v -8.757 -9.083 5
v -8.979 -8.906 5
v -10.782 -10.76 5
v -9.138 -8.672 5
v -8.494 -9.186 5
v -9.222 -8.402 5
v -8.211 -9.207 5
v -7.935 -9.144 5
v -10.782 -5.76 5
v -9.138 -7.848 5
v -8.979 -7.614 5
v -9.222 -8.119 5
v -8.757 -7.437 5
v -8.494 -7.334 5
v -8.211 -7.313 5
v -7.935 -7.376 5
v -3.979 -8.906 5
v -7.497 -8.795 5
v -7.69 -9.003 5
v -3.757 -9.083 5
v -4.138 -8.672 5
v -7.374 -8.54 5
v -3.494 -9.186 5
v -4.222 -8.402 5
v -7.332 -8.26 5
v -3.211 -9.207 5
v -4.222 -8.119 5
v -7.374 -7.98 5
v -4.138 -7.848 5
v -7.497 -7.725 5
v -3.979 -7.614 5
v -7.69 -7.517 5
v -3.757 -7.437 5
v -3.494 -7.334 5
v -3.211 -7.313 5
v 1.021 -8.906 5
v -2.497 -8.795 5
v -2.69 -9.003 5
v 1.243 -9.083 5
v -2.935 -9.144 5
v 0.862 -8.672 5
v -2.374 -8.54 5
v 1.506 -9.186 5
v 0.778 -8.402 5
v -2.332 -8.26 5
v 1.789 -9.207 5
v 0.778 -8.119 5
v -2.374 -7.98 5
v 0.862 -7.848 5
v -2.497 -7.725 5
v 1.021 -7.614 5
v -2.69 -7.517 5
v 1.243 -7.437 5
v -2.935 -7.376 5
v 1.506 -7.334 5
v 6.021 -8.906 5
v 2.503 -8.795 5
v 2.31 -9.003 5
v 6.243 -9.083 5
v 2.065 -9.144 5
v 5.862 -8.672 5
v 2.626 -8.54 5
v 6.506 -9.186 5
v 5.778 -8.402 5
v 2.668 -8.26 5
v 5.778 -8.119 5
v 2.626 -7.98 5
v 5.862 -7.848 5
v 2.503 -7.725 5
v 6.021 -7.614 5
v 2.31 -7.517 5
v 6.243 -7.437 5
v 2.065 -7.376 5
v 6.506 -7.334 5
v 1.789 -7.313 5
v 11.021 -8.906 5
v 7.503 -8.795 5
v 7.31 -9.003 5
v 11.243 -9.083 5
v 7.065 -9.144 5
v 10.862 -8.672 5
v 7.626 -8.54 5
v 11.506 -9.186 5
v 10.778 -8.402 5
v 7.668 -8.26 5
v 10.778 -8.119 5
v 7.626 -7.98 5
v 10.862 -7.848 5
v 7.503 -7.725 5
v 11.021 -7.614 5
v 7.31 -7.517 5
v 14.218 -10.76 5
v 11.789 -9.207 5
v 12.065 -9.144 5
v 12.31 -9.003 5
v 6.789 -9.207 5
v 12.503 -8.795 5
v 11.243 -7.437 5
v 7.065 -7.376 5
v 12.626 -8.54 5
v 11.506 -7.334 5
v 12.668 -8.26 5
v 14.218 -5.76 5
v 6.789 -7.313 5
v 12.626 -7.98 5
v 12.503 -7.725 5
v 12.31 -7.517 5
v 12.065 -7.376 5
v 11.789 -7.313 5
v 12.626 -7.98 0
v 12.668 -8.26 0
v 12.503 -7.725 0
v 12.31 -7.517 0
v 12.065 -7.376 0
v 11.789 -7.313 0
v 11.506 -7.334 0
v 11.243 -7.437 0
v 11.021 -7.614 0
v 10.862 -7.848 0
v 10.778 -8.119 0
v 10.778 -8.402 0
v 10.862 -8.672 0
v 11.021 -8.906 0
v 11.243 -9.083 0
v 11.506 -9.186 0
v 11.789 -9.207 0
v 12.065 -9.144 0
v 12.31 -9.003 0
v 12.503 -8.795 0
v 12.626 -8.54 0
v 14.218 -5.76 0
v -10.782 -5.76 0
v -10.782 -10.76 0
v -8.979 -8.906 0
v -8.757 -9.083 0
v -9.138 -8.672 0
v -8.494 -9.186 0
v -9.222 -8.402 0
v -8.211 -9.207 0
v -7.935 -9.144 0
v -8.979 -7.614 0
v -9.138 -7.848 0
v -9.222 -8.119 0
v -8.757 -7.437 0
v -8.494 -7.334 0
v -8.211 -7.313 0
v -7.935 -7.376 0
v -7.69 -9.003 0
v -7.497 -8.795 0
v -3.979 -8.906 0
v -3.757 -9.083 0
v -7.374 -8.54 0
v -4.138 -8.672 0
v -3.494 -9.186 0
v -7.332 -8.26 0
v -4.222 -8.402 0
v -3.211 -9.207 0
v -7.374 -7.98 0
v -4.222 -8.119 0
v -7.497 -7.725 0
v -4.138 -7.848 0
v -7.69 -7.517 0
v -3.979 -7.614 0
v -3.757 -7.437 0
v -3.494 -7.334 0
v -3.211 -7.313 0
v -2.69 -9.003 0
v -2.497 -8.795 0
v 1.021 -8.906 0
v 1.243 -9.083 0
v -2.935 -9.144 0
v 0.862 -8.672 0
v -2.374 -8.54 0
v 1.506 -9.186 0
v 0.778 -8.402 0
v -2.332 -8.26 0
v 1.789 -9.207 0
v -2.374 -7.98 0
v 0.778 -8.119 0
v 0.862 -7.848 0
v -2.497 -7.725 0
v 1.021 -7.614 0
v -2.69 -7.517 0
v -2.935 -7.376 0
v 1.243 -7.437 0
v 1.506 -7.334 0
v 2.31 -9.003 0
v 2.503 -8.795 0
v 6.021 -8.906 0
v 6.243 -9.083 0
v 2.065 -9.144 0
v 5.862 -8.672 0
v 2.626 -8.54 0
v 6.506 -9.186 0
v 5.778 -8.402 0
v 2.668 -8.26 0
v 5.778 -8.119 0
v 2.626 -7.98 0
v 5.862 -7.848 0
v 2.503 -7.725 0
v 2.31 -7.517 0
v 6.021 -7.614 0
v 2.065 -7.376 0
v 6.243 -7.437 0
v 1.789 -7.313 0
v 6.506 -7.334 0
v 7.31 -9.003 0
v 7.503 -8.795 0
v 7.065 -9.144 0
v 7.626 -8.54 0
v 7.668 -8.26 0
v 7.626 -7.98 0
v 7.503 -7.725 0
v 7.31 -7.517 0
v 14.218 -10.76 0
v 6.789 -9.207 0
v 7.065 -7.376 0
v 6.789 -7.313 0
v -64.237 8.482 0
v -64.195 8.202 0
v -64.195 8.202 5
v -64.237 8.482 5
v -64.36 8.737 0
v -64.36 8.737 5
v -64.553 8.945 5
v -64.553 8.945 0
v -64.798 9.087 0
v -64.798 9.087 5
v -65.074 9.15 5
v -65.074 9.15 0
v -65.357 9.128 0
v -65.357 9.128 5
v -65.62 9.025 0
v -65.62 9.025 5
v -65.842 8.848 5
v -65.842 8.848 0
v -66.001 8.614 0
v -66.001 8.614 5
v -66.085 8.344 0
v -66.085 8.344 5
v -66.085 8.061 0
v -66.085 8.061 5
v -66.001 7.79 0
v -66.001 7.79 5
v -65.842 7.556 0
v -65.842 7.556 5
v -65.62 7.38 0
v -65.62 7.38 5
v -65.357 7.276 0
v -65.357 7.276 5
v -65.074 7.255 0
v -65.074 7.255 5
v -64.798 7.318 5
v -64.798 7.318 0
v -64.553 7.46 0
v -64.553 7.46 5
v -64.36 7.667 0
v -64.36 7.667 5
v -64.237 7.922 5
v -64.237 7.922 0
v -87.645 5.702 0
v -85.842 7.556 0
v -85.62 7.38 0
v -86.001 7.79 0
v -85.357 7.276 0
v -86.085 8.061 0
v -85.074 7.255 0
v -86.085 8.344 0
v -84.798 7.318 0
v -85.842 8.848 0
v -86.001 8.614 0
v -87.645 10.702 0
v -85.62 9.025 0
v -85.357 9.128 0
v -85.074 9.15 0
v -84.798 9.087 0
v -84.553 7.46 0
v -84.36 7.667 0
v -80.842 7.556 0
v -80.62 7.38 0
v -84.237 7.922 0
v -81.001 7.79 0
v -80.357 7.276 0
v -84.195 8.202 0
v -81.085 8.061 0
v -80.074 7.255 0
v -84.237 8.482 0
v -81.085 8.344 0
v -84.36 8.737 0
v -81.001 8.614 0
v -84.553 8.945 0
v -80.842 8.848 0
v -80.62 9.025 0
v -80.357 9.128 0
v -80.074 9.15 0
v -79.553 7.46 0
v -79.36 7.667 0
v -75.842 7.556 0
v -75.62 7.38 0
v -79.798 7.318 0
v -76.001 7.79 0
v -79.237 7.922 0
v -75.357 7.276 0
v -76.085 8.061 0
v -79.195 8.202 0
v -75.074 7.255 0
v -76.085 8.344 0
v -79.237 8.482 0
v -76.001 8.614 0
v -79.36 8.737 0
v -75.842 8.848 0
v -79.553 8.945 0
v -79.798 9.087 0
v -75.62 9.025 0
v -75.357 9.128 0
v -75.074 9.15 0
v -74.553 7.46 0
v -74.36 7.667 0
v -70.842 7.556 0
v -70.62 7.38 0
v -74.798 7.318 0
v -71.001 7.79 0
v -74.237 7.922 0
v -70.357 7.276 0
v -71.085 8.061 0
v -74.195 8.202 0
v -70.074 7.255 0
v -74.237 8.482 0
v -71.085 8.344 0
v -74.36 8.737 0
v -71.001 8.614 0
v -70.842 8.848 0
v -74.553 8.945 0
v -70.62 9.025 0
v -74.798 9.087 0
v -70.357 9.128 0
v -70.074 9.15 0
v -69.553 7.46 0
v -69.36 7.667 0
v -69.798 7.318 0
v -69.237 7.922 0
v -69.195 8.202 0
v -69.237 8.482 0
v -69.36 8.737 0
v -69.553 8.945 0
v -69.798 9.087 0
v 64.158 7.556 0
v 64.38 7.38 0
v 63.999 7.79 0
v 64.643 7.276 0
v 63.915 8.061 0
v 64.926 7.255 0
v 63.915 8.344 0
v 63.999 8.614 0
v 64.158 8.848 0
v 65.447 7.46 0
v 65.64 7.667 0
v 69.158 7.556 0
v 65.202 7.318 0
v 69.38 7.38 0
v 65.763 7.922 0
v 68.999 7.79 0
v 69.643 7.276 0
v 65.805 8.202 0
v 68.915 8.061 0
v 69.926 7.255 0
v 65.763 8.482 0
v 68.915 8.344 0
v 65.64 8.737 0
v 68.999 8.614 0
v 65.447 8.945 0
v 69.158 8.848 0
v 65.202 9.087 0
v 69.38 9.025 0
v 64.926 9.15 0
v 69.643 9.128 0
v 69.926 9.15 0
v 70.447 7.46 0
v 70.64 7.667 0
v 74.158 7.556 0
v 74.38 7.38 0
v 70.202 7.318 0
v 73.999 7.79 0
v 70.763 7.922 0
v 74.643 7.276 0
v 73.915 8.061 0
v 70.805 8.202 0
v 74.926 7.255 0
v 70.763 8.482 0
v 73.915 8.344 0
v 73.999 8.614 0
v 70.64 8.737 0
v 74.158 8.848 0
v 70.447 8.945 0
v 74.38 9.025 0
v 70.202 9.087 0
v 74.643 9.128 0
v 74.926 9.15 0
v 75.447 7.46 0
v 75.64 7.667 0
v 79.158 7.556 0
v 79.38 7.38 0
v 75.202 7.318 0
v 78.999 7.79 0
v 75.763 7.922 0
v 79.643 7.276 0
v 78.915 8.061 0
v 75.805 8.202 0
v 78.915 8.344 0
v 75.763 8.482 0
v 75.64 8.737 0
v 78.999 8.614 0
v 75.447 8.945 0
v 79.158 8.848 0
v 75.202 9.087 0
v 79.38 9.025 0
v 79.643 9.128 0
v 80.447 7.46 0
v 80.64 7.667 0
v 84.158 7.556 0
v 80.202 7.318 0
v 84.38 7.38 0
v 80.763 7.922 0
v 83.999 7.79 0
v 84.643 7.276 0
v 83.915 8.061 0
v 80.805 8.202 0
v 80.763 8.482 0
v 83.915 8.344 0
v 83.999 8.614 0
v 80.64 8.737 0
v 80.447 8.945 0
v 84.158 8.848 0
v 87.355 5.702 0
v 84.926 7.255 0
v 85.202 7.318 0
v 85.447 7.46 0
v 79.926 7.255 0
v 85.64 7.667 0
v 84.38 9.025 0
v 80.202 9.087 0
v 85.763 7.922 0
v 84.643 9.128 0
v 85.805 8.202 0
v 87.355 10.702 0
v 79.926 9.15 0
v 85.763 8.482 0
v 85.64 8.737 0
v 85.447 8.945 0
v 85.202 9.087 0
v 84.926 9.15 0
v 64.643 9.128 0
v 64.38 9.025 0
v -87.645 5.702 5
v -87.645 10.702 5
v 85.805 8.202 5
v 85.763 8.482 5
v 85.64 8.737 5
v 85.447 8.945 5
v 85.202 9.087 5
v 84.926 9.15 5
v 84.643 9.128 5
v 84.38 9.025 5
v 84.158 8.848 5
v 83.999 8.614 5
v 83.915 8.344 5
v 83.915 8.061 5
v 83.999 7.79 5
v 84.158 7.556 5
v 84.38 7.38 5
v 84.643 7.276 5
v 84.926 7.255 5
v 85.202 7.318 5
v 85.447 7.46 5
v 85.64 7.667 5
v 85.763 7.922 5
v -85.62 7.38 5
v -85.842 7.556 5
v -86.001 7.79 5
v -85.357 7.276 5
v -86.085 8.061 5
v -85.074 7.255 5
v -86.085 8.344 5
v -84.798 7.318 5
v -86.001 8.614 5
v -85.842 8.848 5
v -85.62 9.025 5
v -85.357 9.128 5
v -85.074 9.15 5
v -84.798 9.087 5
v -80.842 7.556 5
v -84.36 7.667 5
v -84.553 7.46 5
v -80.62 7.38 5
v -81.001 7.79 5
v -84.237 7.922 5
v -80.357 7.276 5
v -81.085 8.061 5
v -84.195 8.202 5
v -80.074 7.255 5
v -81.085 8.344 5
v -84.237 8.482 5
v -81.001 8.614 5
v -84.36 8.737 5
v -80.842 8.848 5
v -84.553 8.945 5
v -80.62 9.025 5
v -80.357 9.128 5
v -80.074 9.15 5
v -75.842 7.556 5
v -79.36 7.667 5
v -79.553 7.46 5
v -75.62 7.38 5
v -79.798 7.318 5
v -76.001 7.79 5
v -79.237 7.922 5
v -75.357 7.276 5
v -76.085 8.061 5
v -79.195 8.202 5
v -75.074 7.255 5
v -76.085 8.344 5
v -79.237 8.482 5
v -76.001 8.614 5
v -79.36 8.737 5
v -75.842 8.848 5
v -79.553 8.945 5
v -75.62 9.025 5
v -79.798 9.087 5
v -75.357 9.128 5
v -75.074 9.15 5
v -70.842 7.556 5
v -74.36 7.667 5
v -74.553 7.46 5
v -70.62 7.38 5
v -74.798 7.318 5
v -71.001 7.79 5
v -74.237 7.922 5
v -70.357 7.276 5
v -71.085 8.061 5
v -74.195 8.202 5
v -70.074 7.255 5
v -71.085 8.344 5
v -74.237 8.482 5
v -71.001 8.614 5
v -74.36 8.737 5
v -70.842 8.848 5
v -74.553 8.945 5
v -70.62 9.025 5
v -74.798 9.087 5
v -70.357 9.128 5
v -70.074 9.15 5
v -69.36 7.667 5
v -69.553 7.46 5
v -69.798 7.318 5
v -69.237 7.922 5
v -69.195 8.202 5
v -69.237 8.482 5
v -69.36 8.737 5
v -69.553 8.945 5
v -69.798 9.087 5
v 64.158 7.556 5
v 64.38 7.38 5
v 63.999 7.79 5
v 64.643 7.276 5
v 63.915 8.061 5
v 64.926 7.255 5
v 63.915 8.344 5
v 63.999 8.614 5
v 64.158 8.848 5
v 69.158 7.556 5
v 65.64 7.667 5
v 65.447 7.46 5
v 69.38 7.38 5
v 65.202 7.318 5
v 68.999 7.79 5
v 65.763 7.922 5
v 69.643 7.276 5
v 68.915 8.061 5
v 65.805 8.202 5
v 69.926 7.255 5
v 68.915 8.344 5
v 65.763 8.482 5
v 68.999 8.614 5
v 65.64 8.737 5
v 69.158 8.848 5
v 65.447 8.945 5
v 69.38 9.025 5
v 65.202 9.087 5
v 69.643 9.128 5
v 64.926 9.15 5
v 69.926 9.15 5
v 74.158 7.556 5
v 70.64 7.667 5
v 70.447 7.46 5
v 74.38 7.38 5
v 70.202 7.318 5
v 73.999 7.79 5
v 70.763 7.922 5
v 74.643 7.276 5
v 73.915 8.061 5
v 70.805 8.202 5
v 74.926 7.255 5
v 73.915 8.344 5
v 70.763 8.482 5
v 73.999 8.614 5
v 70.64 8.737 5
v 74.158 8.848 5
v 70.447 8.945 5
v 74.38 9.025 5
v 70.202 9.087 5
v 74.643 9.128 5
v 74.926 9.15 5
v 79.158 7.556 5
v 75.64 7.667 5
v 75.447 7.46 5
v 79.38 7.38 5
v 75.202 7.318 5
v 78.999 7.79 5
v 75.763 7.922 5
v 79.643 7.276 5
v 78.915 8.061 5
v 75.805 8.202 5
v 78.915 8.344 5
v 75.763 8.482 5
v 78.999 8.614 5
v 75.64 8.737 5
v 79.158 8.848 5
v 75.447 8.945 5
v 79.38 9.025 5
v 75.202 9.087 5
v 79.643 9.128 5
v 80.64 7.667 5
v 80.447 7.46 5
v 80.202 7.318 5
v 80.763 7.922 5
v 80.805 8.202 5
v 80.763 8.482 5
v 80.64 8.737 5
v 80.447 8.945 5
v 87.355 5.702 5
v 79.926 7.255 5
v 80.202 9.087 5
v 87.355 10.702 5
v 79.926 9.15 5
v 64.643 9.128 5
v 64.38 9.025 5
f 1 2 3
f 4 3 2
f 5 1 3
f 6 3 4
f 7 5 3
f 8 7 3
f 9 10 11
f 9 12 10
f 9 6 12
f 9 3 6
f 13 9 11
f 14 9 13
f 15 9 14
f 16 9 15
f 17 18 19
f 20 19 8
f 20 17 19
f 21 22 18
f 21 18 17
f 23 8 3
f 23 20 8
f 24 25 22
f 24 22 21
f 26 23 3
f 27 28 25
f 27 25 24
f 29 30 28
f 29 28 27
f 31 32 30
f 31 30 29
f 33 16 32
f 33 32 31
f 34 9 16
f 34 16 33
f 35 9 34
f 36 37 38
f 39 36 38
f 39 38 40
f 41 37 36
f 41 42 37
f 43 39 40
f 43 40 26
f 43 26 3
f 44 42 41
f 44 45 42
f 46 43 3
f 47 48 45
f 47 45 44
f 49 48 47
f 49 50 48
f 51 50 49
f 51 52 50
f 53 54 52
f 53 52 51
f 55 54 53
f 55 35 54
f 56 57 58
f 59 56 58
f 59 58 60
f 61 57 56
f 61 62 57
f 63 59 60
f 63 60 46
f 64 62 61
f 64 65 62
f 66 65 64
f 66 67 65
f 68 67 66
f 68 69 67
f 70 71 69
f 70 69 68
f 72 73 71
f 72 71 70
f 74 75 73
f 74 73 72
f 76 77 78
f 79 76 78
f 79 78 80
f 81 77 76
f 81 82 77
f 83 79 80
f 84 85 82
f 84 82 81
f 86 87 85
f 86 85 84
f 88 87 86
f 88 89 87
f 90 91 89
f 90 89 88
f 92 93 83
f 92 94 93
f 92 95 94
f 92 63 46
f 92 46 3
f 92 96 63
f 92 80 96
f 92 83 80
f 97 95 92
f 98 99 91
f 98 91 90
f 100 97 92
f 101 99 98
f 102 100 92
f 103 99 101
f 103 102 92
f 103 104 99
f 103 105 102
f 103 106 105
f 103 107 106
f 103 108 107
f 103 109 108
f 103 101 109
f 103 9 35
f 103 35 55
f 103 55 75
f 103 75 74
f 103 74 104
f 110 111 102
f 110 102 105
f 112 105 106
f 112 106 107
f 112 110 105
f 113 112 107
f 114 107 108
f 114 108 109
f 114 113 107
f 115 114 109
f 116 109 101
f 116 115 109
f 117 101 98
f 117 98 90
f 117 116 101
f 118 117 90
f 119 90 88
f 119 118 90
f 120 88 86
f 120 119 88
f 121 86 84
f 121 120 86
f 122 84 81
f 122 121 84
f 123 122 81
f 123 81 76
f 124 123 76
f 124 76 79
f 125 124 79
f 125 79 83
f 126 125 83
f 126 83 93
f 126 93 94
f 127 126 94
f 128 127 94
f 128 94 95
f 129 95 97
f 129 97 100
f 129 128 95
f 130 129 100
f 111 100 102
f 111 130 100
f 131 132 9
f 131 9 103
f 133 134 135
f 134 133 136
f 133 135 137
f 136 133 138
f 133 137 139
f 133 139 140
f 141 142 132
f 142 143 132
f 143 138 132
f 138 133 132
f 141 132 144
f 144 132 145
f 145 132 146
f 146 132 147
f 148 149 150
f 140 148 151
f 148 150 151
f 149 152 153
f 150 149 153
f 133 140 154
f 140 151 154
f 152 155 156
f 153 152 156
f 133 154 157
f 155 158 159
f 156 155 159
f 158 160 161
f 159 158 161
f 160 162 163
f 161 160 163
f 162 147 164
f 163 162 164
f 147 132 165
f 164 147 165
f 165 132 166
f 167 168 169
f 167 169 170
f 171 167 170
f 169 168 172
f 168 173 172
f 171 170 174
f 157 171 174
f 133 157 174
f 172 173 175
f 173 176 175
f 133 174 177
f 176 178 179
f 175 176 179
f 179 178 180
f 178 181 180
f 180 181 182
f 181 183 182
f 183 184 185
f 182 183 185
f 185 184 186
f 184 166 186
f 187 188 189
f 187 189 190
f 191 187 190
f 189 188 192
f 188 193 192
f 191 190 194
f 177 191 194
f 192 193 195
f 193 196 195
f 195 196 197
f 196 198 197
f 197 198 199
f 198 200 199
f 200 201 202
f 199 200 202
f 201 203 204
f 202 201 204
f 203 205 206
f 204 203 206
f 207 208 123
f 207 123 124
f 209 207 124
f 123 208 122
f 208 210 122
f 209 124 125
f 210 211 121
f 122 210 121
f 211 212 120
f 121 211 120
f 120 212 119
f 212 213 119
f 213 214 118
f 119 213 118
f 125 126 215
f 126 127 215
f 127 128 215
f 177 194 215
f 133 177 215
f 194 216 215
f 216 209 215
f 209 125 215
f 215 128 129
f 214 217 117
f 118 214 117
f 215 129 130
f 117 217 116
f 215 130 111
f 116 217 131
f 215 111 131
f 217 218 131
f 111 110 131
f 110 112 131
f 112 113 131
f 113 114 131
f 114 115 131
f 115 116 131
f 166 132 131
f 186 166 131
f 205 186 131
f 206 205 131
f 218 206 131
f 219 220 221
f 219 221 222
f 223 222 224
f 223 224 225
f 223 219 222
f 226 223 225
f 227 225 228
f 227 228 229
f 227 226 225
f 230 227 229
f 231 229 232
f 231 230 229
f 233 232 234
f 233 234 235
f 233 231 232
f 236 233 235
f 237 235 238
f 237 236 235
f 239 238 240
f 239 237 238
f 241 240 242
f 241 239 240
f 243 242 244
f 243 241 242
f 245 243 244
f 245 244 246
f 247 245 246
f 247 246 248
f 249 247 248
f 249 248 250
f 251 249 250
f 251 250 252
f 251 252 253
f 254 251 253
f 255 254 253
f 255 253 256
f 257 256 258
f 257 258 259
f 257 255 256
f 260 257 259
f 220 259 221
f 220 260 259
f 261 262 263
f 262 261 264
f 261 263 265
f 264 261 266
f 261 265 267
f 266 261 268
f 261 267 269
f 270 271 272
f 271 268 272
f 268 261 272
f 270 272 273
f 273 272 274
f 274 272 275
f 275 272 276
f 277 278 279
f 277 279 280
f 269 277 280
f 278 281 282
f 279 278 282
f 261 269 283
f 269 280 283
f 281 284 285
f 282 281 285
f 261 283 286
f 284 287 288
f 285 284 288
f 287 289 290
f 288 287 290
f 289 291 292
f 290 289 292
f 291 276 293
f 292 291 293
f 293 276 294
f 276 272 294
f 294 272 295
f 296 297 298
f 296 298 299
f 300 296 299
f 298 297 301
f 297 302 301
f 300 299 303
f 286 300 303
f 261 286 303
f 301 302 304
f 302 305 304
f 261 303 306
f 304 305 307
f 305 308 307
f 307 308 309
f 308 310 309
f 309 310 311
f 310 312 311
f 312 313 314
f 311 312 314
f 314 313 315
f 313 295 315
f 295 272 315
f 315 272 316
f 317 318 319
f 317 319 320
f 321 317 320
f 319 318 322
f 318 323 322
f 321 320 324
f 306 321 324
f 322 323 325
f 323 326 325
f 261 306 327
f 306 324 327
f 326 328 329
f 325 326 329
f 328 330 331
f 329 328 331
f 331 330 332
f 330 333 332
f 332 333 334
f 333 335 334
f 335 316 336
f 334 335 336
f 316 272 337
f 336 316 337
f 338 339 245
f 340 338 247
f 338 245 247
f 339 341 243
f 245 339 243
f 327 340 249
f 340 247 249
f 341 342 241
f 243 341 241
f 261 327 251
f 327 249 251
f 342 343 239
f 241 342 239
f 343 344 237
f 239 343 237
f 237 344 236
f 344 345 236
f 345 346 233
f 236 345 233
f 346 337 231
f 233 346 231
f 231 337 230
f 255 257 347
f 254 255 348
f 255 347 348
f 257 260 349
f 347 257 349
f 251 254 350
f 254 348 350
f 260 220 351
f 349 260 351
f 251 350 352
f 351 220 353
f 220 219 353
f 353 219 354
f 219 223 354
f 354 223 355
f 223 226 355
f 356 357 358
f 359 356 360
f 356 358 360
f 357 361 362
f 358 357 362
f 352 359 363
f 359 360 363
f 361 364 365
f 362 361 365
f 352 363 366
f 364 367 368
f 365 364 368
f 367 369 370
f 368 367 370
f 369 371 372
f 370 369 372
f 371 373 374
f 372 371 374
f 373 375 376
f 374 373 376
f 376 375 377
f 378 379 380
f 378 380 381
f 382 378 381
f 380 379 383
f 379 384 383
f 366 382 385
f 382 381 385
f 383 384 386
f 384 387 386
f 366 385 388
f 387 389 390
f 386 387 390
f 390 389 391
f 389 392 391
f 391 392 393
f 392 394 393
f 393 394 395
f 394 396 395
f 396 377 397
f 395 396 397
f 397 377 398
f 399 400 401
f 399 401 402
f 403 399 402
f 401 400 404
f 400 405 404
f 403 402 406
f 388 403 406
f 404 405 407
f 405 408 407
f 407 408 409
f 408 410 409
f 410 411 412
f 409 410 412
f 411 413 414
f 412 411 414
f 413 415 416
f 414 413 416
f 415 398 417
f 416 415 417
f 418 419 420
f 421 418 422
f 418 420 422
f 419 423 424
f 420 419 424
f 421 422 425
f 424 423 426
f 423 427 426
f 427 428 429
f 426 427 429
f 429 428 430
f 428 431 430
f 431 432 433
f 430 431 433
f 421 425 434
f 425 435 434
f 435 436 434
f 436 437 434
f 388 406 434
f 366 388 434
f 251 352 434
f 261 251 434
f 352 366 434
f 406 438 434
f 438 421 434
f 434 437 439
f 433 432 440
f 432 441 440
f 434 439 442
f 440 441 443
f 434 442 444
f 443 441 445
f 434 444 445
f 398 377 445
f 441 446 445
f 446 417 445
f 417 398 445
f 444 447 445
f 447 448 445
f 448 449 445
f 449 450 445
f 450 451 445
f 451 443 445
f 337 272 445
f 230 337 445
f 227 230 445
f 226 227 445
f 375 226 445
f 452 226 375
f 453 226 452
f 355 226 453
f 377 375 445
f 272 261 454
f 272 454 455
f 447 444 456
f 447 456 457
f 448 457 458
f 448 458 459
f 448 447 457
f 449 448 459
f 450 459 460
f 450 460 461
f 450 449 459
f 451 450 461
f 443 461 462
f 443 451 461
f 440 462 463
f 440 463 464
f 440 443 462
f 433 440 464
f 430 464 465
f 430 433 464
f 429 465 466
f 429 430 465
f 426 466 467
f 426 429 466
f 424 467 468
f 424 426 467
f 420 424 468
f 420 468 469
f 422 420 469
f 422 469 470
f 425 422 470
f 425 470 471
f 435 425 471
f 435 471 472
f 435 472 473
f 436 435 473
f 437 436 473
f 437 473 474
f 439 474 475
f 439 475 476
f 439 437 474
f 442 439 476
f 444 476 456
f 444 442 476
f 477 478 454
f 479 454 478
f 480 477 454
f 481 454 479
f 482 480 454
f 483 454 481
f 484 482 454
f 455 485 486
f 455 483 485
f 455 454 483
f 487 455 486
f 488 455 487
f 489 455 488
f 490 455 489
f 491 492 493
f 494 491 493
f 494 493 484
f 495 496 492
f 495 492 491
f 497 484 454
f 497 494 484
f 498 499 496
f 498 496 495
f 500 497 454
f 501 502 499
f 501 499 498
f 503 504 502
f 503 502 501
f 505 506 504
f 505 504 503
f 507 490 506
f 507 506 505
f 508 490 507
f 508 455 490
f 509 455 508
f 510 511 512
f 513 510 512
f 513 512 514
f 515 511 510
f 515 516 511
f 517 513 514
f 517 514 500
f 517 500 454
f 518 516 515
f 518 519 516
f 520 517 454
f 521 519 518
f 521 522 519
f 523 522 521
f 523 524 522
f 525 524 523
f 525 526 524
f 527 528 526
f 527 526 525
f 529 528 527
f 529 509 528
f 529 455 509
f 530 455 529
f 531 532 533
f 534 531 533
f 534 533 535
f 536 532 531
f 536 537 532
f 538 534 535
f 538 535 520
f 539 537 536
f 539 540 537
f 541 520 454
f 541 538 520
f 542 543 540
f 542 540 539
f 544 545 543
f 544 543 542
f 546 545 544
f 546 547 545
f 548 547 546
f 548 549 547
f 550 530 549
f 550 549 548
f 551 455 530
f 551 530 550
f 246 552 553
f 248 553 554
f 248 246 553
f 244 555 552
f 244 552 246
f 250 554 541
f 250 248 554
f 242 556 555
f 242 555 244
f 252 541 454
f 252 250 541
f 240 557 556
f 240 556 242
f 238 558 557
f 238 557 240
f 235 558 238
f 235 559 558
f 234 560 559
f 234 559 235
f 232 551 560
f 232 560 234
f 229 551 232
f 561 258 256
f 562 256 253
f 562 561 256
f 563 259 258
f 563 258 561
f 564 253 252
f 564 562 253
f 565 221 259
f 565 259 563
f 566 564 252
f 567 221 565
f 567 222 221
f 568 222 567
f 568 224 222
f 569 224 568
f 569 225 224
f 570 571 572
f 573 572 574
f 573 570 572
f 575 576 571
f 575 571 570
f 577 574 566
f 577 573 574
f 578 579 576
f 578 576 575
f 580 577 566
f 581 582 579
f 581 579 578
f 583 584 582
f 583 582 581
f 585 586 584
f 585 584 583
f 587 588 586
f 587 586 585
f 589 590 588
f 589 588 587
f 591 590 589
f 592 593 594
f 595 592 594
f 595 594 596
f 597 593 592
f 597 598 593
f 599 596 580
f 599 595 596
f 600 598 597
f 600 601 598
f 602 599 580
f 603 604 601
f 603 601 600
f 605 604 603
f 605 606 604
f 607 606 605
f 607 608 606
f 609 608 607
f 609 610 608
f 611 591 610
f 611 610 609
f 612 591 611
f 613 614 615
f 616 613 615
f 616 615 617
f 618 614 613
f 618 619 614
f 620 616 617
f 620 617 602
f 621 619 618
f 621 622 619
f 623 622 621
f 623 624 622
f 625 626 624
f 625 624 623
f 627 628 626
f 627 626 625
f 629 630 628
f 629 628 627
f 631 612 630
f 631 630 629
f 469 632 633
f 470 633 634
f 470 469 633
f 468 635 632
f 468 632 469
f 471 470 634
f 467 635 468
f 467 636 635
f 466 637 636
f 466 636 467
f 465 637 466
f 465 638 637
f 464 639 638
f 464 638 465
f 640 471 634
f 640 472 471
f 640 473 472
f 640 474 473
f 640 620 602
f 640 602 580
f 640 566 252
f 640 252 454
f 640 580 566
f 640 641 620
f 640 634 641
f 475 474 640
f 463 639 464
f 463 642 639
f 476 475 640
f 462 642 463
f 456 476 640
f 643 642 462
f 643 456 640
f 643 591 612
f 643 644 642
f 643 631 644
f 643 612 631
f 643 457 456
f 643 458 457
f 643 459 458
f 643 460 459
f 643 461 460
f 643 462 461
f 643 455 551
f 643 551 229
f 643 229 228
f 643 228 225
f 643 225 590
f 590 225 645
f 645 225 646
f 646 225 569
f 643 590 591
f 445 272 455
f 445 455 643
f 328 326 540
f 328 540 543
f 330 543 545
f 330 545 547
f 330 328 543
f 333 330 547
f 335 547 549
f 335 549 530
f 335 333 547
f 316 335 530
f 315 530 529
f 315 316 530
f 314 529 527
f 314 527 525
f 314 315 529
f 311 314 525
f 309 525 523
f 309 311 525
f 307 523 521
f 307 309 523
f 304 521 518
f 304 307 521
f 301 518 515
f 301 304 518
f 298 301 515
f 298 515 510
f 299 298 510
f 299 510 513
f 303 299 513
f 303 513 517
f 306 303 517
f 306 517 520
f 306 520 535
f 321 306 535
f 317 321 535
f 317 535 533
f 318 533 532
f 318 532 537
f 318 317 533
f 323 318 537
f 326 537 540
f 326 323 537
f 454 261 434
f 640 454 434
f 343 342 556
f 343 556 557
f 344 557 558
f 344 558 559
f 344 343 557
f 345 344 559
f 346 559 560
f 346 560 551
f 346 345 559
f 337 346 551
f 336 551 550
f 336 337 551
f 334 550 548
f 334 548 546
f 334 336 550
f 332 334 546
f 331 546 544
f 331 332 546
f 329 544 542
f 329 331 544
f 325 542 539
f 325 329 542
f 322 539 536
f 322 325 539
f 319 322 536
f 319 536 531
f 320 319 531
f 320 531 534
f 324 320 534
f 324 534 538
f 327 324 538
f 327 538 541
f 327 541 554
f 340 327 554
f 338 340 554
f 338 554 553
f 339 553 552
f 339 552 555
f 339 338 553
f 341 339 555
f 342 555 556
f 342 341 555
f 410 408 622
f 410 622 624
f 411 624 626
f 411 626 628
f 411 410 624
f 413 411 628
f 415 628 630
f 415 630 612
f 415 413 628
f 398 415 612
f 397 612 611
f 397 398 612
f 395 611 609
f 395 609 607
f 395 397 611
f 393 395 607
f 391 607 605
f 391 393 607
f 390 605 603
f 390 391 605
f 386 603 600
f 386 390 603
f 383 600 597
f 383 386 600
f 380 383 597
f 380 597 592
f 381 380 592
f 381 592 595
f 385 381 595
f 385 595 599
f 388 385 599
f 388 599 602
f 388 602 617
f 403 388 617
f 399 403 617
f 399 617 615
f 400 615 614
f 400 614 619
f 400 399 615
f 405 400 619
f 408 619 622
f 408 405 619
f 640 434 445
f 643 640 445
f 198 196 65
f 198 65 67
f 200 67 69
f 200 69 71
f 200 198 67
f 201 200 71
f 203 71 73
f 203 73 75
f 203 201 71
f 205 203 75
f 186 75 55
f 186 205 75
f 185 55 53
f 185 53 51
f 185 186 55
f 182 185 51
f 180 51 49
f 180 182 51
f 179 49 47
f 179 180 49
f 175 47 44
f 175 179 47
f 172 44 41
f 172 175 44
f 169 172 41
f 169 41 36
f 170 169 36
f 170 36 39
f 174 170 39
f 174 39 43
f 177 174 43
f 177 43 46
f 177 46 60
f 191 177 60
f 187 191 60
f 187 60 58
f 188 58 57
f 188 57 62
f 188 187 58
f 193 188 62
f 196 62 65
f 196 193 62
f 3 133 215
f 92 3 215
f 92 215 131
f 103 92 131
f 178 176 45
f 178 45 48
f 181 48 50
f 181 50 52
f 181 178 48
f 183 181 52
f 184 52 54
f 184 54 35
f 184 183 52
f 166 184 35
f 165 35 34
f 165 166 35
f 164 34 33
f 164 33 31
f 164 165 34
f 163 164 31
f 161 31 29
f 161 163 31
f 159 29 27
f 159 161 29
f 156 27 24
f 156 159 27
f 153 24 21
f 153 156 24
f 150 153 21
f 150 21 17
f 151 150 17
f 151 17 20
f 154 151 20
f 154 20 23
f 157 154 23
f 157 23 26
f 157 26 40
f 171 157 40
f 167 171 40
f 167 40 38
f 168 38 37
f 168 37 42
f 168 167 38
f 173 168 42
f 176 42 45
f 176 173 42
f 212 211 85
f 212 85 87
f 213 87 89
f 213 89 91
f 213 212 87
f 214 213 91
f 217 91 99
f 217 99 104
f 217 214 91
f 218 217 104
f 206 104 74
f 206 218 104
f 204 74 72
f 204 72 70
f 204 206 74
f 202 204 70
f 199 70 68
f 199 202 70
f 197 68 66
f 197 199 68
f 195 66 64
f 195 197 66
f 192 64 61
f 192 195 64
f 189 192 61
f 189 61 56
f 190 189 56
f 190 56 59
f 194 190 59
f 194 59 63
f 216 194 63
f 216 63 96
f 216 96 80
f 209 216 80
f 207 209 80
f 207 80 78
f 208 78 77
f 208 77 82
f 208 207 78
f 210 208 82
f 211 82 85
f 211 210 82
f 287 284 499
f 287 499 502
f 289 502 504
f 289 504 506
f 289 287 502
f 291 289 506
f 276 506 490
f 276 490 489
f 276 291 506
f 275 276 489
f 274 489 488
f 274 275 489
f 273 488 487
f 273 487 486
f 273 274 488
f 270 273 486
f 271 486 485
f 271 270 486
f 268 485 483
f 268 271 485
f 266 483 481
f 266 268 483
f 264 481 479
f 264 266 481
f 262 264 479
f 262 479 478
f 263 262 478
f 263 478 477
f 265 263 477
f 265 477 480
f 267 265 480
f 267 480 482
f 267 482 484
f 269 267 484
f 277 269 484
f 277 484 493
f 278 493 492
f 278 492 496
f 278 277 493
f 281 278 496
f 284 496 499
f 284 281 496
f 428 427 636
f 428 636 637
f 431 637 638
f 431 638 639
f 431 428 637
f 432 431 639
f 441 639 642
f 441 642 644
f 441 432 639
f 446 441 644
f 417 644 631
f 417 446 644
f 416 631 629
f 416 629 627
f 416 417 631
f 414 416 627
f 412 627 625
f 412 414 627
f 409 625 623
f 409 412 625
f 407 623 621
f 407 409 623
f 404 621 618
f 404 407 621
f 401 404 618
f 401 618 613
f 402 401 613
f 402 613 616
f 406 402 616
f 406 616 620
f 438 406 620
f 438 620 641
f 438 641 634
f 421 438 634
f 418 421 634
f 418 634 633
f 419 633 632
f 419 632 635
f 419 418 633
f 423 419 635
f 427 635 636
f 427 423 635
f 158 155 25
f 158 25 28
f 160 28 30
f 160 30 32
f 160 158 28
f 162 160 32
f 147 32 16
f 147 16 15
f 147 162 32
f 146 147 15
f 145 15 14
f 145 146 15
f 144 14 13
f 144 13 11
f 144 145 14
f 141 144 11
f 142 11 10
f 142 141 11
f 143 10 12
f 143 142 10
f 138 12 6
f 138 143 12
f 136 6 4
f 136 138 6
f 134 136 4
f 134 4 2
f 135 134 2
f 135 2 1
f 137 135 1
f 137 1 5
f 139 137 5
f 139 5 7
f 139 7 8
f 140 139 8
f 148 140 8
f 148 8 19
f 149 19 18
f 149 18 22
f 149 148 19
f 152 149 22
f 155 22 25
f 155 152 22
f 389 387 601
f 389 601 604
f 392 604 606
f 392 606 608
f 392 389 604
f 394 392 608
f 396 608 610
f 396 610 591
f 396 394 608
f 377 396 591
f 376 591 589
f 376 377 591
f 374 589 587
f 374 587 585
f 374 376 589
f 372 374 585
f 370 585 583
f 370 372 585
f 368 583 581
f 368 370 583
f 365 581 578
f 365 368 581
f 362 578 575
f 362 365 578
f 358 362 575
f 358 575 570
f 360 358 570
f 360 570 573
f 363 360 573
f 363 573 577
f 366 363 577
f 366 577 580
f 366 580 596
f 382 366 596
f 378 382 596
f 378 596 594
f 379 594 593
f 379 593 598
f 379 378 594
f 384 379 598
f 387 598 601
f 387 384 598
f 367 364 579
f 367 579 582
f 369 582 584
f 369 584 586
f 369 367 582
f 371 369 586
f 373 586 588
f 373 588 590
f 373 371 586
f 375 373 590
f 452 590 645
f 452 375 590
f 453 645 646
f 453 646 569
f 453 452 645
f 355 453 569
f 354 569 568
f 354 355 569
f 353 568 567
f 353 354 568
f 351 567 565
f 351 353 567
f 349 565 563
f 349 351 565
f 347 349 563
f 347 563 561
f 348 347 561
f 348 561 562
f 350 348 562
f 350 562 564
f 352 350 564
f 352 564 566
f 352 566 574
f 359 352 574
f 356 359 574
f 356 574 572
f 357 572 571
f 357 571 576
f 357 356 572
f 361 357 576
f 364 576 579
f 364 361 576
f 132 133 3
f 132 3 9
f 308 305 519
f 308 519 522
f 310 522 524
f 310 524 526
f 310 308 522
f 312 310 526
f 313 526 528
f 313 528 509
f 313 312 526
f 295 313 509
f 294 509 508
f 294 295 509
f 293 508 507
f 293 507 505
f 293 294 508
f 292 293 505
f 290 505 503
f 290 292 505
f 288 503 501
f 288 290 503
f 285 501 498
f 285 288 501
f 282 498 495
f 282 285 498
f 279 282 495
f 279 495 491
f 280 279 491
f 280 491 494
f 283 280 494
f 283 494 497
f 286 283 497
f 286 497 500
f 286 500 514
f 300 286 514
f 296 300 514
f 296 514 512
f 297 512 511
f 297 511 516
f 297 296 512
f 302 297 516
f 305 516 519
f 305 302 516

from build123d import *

# Parameters (mm, degrees)
F0_W     = 25
F0_H     = 5
F0_R     = 0.95
F0_W_2   = 175
F1_DEPTH = 5


with BuildPart() as f1:
    # F0 (on Top) → F1 (new body)
    with BuildSketch(Plane.XY):
        with Locations((1.717769, -8.260114)):
            Rectangle(F0_W, F0_H)
        with Locations((-8.282231, -8.260114)):
            Circle(F0_R, mode=Mode.SUBTRACT)
        with Locations((-3.282231, -8.260114)):
            Circle(F0_R, mode=Mode.SUBTRACT)
        with Locations((1.717769, -8.260114)):
            Circle(F0_R, mode=Mode.SUBTRACT)
        with Locations((6.717769, -8.260114)):
            Circle(F0_R, mode=Mode.SUBTRACT)
        with Locations((11.717769, -8.260114)):
            Circle(F0_R, mode=Mode.SUBTRACT)
        with Locations((-0.145234, 8.2023)):
            Rectangle(F0_W_2, F0_H)
        with Locations((-85.145234, 8.2023)):
            Circle(F0_R, mode=Mode.SUBTRACT)
        with Locations((-80.145234, 8.2023)):
            Circle(F0_R, mode=Mode.SUBTRACT)
        with Locations((-75.145234, 8.2023)):
            Circle(F0_R, mode=Mode.SUBTRACT)
        with Locations((-70.145234, 8.2023)):
            Circle(F0_R, mode=Mode.SUBTRACT)
        with Locations((-65.145234, 8.2023)):
            Circle(F0_R, mode=Mode.SUBTRACT)
        with Locations((64.854766, 8.2023)):
            Circle(F0_R, mode=Mode.SUBTRACT)
        with Locations((69.854766, 8.2023)):
            Circle(F0_R, mode=Mode.SUBTRACT)
        with Locations((74.854766, 8.2023)):
            Circle(F0_R, mode=Mode.SUBTRACT)
        with Locations((79.854766, 8.2023)):
            Circle(F0_R, mode=Mode.SUBTRACT)
        with Locations((84.854766, 8.2023)):
            Circle(F0_R, mode=Mode.SUBTRACT)
    extrude(amount=F1_DEPTH)


solid = f1.part
